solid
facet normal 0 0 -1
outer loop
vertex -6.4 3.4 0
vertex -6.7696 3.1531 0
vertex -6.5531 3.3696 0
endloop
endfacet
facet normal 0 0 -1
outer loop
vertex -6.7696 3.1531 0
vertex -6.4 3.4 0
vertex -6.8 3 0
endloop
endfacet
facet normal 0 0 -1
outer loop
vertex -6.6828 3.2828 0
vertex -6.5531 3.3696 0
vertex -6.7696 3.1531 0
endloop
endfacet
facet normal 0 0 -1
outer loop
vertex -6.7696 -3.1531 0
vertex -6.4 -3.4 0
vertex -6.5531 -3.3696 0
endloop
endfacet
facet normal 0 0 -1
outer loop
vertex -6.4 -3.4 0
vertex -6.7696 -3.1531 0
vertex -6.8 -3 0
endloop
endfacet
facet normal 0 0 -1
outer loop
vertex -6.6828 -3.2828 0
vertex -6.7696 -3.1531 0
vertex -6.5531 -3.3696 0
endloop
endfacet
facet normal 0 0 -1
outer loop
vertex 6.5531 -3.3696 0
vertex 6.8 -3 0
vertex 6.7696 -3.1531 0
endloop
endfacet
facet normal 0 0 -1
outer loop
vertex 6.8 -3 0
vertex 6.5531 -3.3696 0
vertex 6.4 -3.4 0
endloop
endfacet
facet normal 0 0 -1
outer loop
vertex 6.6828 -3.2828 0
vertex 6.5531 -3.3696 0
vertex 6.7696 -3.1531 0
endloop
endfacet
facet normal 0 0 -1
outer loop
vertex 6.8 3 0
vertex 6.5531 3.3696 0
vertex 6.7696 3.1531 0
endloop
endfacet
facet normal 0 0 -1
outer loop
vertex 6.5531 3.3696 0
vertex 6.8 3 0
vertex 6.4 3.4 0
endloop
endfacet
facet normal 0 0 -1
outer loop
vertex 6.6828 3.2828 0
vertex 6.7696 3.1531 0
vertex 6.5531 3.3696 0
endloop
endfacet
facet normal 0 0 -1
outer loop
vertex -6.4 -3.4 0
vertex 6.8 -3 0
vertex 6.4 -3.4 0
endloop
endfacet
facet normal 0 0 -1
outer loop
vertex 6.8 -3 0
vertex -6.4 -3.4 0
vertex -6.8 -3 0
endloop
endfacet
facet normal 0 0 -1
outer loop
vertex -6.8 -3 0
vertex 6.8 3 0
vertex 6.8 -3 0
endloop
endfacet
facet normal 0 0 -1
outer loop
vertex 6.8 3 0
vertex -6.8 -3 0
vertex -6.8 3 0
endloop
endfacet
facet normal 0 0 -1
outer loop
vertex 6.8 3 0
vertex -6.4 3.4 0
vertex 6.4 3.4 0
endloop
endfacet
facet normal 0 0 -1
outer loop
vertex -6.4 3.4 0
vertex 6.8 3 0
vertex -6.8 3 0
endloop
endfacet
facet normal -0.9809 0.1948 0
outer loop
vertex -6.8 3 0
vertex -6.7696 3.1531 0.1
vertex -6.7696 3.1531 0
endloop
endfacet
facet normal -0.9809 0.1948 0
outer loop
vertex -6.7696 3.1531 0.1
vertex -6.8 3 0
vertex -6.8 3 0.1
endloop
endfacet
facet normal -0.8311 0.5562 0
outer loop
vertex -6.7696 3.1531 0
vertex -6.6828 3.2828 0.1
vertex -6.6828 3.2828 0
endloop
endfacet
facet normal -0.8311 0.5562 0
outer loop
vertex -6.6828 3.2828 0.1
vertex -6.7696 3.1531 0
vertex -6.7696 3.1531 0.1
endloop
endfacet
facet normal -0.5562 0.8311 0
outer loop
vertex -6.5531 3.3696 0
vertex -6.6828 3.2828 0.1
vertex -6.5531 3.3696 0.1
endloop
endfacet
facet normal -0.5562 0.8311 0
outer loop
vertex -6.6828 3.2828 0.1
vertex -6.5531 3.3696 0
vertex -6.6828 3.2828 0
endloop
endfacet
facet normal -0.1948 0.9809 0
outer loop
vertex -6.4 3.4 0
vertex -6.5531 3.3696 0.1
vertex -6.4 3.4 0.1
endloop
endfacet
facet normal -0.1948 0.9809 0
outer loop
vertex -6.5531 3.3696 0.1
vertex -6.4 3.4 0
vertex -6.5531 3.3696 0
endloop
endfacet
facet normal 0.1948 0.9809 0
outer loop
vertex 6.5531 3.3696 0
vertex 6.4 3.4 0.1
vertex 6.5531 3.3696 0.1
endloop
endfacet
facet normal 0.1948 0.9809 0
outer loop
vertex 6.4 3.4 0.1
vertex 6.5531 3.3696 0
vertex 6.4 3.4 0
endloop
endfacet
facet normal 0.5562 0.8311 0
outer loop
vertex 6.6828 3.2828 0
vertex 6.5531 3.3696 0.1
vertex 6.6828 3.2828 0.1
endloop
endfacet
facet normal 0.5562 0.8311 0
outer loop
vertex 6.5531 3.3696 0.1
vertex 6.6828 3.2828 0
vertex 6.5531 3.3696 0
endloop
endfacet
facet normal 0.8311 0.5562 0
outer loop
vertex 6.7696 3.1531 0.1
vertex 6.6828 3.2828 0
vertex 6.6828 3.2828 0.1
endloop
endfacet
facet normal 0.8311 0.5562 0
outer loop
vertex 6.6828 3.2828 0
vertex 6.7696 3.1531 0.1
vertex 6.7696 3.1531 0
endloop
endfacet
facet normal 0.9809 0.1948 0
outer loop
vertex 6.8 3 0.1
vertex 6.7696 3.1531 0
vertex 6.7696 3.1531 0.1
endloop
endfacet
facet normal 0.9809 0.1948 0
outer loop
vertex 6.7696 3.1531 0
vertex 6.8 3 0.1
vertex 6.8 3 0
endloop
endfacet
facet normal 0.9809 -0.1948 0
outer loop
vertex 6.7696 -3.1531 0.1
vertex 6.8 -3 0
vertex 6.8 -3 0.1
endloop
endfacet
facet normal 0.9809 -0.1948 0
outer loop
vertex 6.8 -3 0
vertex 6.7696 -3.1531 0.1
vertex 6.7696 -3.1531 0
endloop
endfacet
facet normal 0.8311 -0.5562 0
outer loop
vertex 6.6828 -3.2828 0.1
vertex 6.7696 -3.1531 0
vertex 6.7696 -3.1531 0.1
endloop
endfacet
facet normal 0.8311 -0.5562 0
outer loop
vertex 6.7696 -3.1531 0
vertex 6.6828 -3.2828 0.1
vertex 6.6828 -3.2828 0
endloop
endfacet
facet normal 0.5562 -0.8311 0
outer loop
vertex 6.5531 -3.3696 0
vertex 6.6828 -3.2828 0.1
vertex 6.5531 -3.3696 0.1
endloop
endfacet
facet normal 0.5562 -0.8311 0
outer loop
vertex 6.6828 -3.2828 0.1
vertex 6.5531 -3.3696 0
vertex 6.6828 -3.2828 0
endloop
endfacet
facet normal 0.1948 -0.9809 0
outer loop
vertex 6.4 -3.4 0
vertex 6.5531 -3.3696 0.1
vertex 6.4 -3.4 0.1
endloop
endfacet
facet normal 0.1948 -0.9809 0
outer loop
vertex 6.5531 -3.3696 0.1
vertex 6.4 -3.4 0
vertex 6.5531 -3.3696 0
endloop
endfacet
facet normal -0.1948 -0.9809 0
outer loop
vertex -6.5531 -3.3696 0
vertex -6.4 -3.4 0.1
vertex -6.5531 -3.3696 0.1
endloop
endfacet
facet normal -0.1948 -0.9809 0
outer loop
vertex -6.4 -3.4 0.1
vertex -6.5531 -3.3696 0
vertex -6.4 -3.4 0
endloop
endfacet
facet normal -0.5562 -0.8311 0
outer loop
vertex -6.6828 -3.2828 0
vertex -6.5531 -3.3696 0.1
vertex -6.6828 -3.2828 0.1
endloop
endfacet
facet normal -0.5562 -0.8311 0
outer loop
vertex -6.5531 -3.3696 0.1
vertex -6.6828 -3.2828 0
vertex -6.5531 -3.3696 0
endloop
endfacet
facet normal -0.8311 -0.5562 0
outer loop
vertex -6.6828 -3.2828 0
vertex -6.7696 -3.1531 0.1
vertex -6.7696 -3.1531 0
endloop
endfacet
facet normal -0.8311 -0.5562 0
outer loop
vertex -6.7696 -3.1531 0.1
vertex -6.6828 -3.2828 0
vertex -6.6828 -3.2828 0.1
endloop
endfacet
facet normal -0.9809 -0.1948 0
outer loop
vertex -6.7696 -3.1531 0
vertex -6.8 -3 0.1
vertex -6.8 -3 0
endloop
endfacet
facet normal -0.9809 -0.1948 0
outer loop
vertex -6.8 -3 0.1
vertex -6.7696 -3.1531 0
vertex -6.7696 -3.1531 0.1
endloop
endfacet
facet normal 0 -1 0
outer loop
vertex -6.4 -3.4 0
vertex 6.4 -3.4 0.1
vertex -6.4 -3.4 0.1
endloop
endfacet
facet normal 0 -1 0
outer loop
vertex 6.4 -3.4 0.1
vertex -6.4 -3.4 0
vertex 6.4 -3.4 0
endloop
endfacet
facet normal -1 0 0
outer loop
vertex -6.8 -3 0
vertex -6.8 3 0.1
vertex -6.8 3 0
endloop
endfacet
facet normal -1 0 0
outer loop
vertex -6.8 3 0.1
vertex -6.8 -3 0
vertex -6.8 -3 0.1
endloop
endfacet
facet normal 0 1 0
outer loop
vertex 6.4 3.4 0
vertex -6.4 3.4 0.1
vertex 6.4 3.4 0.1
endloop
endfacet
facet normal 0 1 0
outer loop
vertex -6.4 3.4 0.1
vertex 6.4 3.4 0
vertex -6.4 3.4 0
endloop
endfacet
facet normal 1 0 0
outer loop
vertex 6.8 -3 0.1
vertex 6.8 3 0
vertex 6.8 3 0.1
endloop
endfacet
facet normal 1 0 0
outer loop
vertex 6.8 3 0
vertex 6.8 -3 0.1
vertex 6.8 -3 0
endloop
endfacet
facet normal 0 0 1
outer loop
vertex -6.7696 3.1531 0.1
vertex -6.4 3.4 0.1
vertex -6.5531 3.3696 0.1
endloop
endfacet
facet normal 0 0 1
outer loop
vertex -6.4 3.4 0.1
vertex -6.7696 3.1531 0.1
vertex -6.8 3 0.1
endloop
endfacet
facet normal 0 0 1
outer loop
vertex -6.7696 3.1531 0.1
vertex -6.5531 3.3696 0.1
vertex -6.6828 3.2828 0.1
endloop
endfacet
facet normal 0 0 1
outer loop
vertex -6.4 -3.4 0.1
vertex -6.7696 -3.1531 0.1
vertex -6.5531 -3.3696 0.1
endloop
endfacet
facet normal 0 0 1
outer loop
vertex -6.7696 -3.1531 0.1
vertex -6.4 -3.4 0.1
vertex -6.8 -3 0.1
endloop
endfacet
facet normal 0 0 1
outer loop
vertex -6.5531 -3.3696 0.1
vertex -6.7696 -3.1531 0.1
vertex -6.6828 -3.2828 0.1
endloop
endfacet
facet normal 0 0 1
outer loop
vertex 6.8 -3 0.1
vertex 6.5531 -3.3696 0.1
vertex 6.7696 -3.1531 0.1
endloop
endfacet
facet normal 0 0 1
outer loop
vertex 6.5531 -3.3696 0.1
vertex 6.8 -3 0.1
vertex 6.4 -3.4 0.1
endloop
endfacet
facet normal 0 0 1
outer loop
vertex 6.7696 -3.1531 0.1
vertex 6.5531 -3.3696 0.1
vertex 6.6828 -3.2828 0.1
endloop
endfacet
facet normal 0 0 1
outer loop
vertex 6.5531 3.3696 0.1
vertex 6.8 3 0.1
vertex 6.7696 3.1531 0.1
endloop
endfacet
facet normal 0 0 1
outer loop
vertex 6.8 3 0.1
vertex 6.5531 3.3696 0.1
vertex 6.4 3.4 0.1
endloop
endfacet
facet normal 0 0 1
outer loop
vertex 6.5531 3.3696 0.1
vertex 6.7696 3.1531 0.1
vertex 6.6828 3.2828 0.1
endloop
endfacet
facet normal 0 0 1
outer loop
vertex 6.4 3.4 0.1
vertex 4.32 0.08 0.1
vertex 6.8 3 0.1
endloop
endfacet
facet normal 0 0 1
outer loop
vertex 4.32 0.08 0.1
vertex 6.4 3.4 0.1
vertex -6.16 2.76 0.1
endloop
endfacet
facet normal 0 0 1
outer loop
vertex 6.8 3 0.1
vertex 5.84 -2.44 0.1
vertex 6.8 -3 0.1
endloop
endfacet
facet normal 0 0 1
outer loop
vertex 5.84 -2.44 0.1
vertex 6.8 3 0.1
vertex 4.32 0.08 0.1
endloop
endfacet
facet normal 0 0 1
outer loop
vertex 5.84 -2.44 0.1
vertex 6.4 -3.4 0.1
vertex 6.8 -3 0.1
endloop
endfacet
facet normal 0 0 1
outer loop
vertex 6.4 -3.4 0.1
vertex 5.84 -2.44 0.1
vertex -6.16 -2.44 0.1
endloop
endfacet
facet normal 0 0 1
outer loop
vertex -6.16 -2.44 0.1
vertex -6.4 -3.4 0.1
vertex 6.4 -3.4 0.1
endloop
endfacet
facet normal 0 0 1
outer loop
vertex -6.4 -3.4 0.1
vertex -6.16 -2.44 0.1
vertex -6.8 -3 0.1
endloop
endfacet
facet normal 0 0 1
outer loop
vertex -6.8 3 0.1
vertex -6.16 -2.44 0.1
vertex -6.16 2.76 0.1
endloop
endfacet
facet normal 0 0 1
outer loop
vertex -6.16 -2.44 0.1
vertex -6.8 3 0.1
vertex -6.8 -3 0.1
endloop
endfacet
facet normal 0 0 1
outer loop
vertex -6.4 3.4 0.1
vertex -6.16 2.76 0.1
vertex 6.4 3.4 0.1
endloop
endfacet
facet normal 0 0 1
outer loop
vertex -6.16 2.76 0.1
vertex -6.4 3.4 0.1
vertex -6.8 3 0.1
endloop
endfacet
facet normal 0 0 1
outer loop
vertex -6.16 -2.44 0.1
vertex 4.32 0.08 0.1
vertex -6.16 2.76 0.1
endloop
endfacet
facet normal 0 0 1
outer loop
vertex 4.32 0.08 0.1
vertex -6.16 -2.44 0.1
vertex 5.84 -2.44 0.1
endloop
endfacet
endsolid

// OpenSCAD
// file: ../p/1-4cyli.scad
use <../lib.scad>
function ldraw_lib__1_4cyli() = [
// 0 Cylinder 0.25
// 0 Name: 1-4cyli.dat
// 0 Author: James Jessiman
// 0 !LDRAW_ORG Primitive UPDATE 2012-01
// 0 !LICENSE Licensed under CC BY 4.0 : see CAreadme.txt
// 
// 0 BFC CERTIFY CCW
  [0,"BFC","CERTIFY"],
  [0,"BFC","CCW"],
// 
// 0 !HISTORY 2002-03-23 [sbliss] Added BFC statement.
// 0 !HISTORY 2002-04-25 [PTadmin] Official Update 2002-02
// 0 !HISTORY 2007-06-22 [PTadmin] Header formatted for Contributor Agreement
// 0 !HISTORY 2008-07-01 [PTadmin] Official Update 2008-01
// 0 !HISTORY 2012-02-16 [Philo] Changed to CCW
// 0 !HISTORY 2012-03-30 [PTadmin] Official Update 2012-01
// 
// 
// 4 16 1 1 0 0.9239 1 0.3827 0.9239 0 0.3827 1 0 0
  [4,16,1,1,0,0.9239,1,0.3827,0.9239,0,0.3827,1,0,0],
// 5 24 1 0 0 1 1 0 0.9239 0 0.3827 1 0 -1
  [5,24,1,0,0,1,1,0,0.9239,0,0.3827,1,0,-1],
// 4 16 0.9239 1 0.3827 0.7071 1 0.7071 0.7071 0 0.7071 0.9239 0 0.3827
  [4,16,0.9239,1,0.3827,0.7071,1,0.7071,0.7071,0,0.7071,0.9239,0,0.3827],
// 5 24 0.9239 0 0.3827 0.9239 1 0.3827 0.7071 0 0.7071 1 0 0
  [5,24,0.9239,0,0.3827,0.9239,1,0.3827,0.7071,0,0.7071,1,0,0],
// 4 16 0.7071 1 0.7071 0.3827 1 0.9239 0.3827 0 0.9239 0.7071 0 0.7071
  [4,16,0.7071,1,0.7071,0.3827,1,0.9239,0.3827,0,0.9239,0.7071,0,0.7071],
// 5 24 0.7071 0 0.7071 0.7071 1 0.7071 0.3827 0 0.9239 0.9239 0 0.3827
  [5,24,0.7071,0,0.7071,0.7071,1,0.7071,0.3827,0,0.9239,0.9239,0,0.3827],
// 4 16 0.3827 1 0.9239 0 1 1 0 0 1 0.3827 0 0.9239
  [4,16,0.3827,1,0.9239,0,1,1,0,0,1,0.3827,0,0.9239],
// 5 24 0.3827 0 0.9239 0.3827 1 0.9239 0 0 1 0.7071 0 0.7071
  [5,24,0.3827,0,0.9239,0.3827,1,0.9239,0,0,1,0.7071,0,0.7071],
// 5 24 0 0 1 0 1 1 0.3827 0 0.9239 -1 0 1
  [5,24,0,0,1,0,1,1,0.3827,0,0.9239,-1,0,1],
];
module ldraw_lib__1_4cyli(step=0, col=false, unit=2/5, alt=false, line=0.2, solid=!$preview)
    makepoly(ldraw_lib__1_4cyli(), step=step, col=col, unit=unit, alt=alt, line=line, solid=solid);
ldraw_lib__1_4cyli(line=0.2);
// file: ../p/1-4chrd.scad
use <../lib.scad>
function ldraw_lib__1_4chrd() = [
// 0 Chord 0.25
// 0 Name: 1-4chrd.dat
// 0 Author: Max Martin Richter [MMR1988]
// 0 !LDRAW_ORG Primitive UPDATE 2023-05
// 0 !LICENSE Licensed under CC BY 4.0 : see CAreadme.txt
// 
// 0 BFC CERTIFY CCW
  [0,"BFC","CERTIFY"],
  [0,"BFC","CCW"],
// 
// 0 !HISTORY 2004-04-22 [PTadmin] Official Update 2004-02
// 0 !HISTORY 2007-10-09 [PTadmin] Header formatted for Contributor Agreement
// 0 !HISTORY 2008-07-01 [PTadmin] Official Update 2008-01
// 0 !HISTORY 2012-08-02 [MMR1988] Re-creation with PrimGen2 and Rectifier
// 0 !HISTORY 2012-08-09 [PTadmin] Official Update 2012-02
// 0 !HISTORY 2023-10-27 [OrionP] Change author to MMR1988 from hafhead
// 0 !HISTORY 2023-10-31 [OrionP] Official Update 2023-05
// 
// 4 16 0.9239 0 0.3827 0.3827 0 0.9239 0 0 1 1 0 0
  [4,16,0.9239,0,0.3827,0.3827,0,0.9239,0,0,1,1,0,0],
// 3 16 0.7071 0 0.7071 0.3827 0 0.9239 0.9239 0 0.3827
  [3,16,0.7071,0,0.7071,0.3827,0,0.9239,0.9239,0,0.3827],
];
module ldraw_lib__1_4chrd(step=0, col=false, unit=2/5, alt=false, line=0.2, solid=!$preview)
    makepoly(ldraw_lib__1_4chrd(), step=step, col=col, unit=unit, alt=alt, line=line, solid=solid);
ldraw_lib__1_4chrd(line=0.2);
// file: 6347356i.scad
use <../lib.scad>
use <../p/1-4chrd.scad>
use <../p/1-4cyli.scad>
function ldraw_lib__6347356i() = [
// 0 Sticker  0.8 x  1.7 with Bright Light Orange Trapezoid Long Left
// 0 Name: 6347356i.dat
// 0 Author: Evert-Jan Boer [ejboer]
// 0 !LDRAW_ORG Part UPDATE 2024-06
// 0 !LICENSE Licensed under CC BY 4.0 : see CAreadme.txt
// 
// 0 BFC CERTIFY CCW
  [0,"BFC","CERTIFY"],
  [0,"BFC","CCW"],
// 
// 0 !KEYWORDS Republic Gunship, Set 75309, Star Wars
// 
// 0 !HISTORY 2024-07-29 [OrionP] Official Update 2024-06
// 
// 1 16 16 0 7.5 1 0 0 0 -1 0 0 0 1 1-4chrd.dat
  [1,16,16,0,7.5,1,0,0,0,-1,0,0,0,1, ldraw_lib__1_4chrd()],
// 1 16 16 0 -7.5 0 0 1 0 -1 0 -1 0 0 1-4chrd.dat
  [1,16,16,0,-7.5,0,0,1,0,-1,0,-1,0,0, ldraw_lib__1_4chrd()],
// 1 16 -16 0 -7.5 -1 0 0 0 -1 0 0 0 -1 1-4chrd.dat
  [1,16,-16,0,-7.5,-1,0,0,0,-1,0,0,0,-1, ldraw_lib__1_4chrd()],
// 1 16 -16 0 7.5 0 0 -1 0 -1 0 1 0 0 1-4chrd.dat
  [1,16,-16,0,7.5,0,0,-1,0,-1,0,1,0,0, ldraw_lib__1_4chrd()],
// 4 16 16 0 -8.5 -16 0 -8.5 -17 0 -7.5 17 0 -7.5
  [4,16,16,0,-8.5,-16,0,-8.5,-17,0,-7.5,17,0,-7.5],
// 4 16 17 0 7.5 17 0 -7.5 -17 0 -7.5 -17 0 7.5
  [4,16,17,0,7.5,17,0,-7.5,-17,0,-7.5,-17,0,7.5],
// 4 16 17 0 7.5 -17 0 7.5 -16 0 8.5 16 0 8.5
  [4,16,17,0,7.5,-17,0,7.5,-16,0,8.5,16,0,8.5],
// 
// 1 16 16 -.25 7.5 1 0 0 0 .25 0 0 0 1 1-4cyli.dat
  [1,16,16,-.25,7.5,1,0,0,0,.25,0,0,0,1, ldraw_lib__1_4cyli()],
// 1 16 -16 -.25 7.5 0 0 -1 0 .25 0 1 0 0 1-4cyli.dat
  [1,16,-16,-.25,7.5,0,0,-1,0,.25,0,1,0,0, ldraw_lib__1_4cyli()],
// 1 16 -16 -.25 -7.5 -1 0 0 0 .25 0 0 0 -1 1-4cyli.dat
  [1,16,-16,-.25,-7.5,-1,0,0,0,.25,0,0,0,-1, ldraw_lib__1_4cyli()],
// 1 16 16 -.25 -7.5 0 0 1 0 .25 0 -1 0 0 1-4cyli.dat
  [1,16,16,-.25,-7.5,0,0,1,0,.25,0,-1,0,0, ldraw_lib__1_4cyli()],
// 4 16 16 -.25 -8.5 -16 -.25 -8.5 -16 0 -8.5 16 0 -8.5
  [4,16,16,-.25,-8.5,-16,-.25,-8.5,-16,0,-8.5,16,0,-8.5],
// 4 16 17 -.25 7.5 17 -.25 -7.5 17 0 -7.5 17 0 7.5
  [4,16,17,-.25,7.5,17,-.25,-7.5,17,0,-7.5,17,0,7.5],
// 4 16 -16 -.25 8.5 16 -.25 8.5 16 0 8.5 -16 0 8.5
  [4,16,-16,-.25,8.5,16,-.25,8.5,16,0,8.5,-16,0,8.5],
// 4 16 -17 -.25 -7.5 -17 -.25 7.5 -17 0 7.5 -17 0 -7.5
  [4,16,-17,-.25,-7.5,-17,-.25,7.5,-17,0,7.5,-17,0,-7.5],
// 
// 1 16 16 -.25 7.5 1 0 0 0 1 0 0 0 1 1-4chrd.dat
  [1,16,16,-.25,7.5,1,0,0,0,1,0,0,0,1, ldraw_lib__1_4chrd()],
// 1 16 16 -.25 -7.5 0 0 1 0 1 0 -1 0 0 1-4chrd.dat
  [1,16,16,-.25,-7.5,0,0,1,0,1,0,-1,0,0, ldraw_lib__1_4chrd()],
// 1 16 -16 -.25 -7.5 -1 0 0 0 1 0 0 0 -1 1-4chrd.dat
  [1,16,-16,-.25,-7.5,-1,0,0,0,1,0,0,0,-1, ldraw_lib__1_4chrd()],
// 1 16 -16 -.25 7.5 0 0 -1 0 1 0 1 0 0 1-4chrd.dat
  [1,16,-16,-.25,7.5,0,0,-1,0,1,0,1,0,0, ldraw_lib__1_4chrd()],
// 4 16 15.4 -.25 6.9 -16 -.25 8.5 -17 -.25 7.5 -10.8 -.25 .2
  [4,16,15.4,-.25,6.9,-16,-.25,8.5,-17,-.25,7.5,-10.8,-.25,.2],
// 4 16 -17 -.25 -7.5 -14.6 -.25 -6.1 -10.8 -.25 .2 -17 -.25 7.5
  [4,16,-17,-.25,-7.5,-14.6,-.25,-6.1,-10.8,-.25,.2,-17,-.25,7.5],
// 4 16 -17 -.25 -7.5 -16 -.25 -8.5 15.4 -.25 -6.1 -14.6 -.25 -6.1
  [4,16,-17,-.25,-7.5,-16,-.25,-8.5,15.4,-.25,-6.1,-14.6,-.25,-6.1],
// 4 16 17 -.25 -7.5 15.4 -.25 -6.1 -16 -.25 -8.5 16 -.25 -8.5
  [4,16,17,-.25,-7.5,15.4,-.25,-6.1,-16,-.25,-8.5,16,-.25,-8.5],
// 4 16 15.4 -.25 -6.1 17 -.25 -7.5 17 -.25 7.5 15.4 -.25 6.9
  [4,16,15.4,-.25,-6.1,17,-.25,-7.5,17,-.25,7.5,15.4,-.25,6.9],
// 4 16 -16 -.25 8.5 15.4 -.25 6.9 17 -.25 7.5 16 -.25 8.5
  [4,16,-16,-.25,8.5,15.4,-.25,6.9,17,-.25,7.5,16,-.25,8.5],
// 
// 0 BFC NOCLIP
  [0,"BFC","NOCLIP"],
// 4 191 -14.6 -.25 -6.1 15.4 -.25 -6.1 15.4 -.25 6.9 -10.8 -.25 .2
  [4,191,-14.6,-.25,-6.1,15.4,-.25,-6.1,15.4,-.25,6.9,-10.8,-.25,.2],
];
module ldraw_lib__6347356i(step=0, col=false, unit=2/5, alt=false, line=0.2, solid=!$preview)
    makepoly(ldraw_lib__6347356i(), step=step, col=col, unit=unit, alt=alt, line=line, solid=solid);
ldraw_lib__6347356i(line=0.2);
// main file
use <../lib.scad>
use <6347356i.scad>
function ldraw_lib__6347356j() = [
// 0 Sticker  0.8 x  1.7 with Bright Light Orange Trapezoid Long Right
// 0 Name: 6347356j.dat
// 0 Author: Evert-Jan Boer [ejboer]
// 0 !LDRAW_ORG Part UPDATE 2024-06
// 0 !LICENSE Licensed under CC BY 4.0 : see CAreadme.txt
// 
// 0 BFC CERTIFY CCW
  [0,"BFC","CERTIFY"],
  [0,"BFC","CCW"],
// 
// 0 !KEYWORDS Republic Gunship, Set 75309, Star Wars
// 
// 0 !HISTORY 2024-07-29 [OrionP] Official Update 2024-06
// 
// 1 16 0 0 0 -1 0 0 0 1 0 0 0 1 6347356i.dat
  [1,16,0,0,0,-1,0,0,0,1,0,0,0,1, ldraw_lib__6347356i()],
];
module ldraw_lib__6347356j(step=0, col=false, unit=2/5, alt=false, line=0.2, solid=!$preview)
    makepoly(ldraw_lib__6347356j(), step=step, col=col, unit=unit, alt=alt, line=line, solid=solid);
ldraw_lib__6347356j(line=0.2);
